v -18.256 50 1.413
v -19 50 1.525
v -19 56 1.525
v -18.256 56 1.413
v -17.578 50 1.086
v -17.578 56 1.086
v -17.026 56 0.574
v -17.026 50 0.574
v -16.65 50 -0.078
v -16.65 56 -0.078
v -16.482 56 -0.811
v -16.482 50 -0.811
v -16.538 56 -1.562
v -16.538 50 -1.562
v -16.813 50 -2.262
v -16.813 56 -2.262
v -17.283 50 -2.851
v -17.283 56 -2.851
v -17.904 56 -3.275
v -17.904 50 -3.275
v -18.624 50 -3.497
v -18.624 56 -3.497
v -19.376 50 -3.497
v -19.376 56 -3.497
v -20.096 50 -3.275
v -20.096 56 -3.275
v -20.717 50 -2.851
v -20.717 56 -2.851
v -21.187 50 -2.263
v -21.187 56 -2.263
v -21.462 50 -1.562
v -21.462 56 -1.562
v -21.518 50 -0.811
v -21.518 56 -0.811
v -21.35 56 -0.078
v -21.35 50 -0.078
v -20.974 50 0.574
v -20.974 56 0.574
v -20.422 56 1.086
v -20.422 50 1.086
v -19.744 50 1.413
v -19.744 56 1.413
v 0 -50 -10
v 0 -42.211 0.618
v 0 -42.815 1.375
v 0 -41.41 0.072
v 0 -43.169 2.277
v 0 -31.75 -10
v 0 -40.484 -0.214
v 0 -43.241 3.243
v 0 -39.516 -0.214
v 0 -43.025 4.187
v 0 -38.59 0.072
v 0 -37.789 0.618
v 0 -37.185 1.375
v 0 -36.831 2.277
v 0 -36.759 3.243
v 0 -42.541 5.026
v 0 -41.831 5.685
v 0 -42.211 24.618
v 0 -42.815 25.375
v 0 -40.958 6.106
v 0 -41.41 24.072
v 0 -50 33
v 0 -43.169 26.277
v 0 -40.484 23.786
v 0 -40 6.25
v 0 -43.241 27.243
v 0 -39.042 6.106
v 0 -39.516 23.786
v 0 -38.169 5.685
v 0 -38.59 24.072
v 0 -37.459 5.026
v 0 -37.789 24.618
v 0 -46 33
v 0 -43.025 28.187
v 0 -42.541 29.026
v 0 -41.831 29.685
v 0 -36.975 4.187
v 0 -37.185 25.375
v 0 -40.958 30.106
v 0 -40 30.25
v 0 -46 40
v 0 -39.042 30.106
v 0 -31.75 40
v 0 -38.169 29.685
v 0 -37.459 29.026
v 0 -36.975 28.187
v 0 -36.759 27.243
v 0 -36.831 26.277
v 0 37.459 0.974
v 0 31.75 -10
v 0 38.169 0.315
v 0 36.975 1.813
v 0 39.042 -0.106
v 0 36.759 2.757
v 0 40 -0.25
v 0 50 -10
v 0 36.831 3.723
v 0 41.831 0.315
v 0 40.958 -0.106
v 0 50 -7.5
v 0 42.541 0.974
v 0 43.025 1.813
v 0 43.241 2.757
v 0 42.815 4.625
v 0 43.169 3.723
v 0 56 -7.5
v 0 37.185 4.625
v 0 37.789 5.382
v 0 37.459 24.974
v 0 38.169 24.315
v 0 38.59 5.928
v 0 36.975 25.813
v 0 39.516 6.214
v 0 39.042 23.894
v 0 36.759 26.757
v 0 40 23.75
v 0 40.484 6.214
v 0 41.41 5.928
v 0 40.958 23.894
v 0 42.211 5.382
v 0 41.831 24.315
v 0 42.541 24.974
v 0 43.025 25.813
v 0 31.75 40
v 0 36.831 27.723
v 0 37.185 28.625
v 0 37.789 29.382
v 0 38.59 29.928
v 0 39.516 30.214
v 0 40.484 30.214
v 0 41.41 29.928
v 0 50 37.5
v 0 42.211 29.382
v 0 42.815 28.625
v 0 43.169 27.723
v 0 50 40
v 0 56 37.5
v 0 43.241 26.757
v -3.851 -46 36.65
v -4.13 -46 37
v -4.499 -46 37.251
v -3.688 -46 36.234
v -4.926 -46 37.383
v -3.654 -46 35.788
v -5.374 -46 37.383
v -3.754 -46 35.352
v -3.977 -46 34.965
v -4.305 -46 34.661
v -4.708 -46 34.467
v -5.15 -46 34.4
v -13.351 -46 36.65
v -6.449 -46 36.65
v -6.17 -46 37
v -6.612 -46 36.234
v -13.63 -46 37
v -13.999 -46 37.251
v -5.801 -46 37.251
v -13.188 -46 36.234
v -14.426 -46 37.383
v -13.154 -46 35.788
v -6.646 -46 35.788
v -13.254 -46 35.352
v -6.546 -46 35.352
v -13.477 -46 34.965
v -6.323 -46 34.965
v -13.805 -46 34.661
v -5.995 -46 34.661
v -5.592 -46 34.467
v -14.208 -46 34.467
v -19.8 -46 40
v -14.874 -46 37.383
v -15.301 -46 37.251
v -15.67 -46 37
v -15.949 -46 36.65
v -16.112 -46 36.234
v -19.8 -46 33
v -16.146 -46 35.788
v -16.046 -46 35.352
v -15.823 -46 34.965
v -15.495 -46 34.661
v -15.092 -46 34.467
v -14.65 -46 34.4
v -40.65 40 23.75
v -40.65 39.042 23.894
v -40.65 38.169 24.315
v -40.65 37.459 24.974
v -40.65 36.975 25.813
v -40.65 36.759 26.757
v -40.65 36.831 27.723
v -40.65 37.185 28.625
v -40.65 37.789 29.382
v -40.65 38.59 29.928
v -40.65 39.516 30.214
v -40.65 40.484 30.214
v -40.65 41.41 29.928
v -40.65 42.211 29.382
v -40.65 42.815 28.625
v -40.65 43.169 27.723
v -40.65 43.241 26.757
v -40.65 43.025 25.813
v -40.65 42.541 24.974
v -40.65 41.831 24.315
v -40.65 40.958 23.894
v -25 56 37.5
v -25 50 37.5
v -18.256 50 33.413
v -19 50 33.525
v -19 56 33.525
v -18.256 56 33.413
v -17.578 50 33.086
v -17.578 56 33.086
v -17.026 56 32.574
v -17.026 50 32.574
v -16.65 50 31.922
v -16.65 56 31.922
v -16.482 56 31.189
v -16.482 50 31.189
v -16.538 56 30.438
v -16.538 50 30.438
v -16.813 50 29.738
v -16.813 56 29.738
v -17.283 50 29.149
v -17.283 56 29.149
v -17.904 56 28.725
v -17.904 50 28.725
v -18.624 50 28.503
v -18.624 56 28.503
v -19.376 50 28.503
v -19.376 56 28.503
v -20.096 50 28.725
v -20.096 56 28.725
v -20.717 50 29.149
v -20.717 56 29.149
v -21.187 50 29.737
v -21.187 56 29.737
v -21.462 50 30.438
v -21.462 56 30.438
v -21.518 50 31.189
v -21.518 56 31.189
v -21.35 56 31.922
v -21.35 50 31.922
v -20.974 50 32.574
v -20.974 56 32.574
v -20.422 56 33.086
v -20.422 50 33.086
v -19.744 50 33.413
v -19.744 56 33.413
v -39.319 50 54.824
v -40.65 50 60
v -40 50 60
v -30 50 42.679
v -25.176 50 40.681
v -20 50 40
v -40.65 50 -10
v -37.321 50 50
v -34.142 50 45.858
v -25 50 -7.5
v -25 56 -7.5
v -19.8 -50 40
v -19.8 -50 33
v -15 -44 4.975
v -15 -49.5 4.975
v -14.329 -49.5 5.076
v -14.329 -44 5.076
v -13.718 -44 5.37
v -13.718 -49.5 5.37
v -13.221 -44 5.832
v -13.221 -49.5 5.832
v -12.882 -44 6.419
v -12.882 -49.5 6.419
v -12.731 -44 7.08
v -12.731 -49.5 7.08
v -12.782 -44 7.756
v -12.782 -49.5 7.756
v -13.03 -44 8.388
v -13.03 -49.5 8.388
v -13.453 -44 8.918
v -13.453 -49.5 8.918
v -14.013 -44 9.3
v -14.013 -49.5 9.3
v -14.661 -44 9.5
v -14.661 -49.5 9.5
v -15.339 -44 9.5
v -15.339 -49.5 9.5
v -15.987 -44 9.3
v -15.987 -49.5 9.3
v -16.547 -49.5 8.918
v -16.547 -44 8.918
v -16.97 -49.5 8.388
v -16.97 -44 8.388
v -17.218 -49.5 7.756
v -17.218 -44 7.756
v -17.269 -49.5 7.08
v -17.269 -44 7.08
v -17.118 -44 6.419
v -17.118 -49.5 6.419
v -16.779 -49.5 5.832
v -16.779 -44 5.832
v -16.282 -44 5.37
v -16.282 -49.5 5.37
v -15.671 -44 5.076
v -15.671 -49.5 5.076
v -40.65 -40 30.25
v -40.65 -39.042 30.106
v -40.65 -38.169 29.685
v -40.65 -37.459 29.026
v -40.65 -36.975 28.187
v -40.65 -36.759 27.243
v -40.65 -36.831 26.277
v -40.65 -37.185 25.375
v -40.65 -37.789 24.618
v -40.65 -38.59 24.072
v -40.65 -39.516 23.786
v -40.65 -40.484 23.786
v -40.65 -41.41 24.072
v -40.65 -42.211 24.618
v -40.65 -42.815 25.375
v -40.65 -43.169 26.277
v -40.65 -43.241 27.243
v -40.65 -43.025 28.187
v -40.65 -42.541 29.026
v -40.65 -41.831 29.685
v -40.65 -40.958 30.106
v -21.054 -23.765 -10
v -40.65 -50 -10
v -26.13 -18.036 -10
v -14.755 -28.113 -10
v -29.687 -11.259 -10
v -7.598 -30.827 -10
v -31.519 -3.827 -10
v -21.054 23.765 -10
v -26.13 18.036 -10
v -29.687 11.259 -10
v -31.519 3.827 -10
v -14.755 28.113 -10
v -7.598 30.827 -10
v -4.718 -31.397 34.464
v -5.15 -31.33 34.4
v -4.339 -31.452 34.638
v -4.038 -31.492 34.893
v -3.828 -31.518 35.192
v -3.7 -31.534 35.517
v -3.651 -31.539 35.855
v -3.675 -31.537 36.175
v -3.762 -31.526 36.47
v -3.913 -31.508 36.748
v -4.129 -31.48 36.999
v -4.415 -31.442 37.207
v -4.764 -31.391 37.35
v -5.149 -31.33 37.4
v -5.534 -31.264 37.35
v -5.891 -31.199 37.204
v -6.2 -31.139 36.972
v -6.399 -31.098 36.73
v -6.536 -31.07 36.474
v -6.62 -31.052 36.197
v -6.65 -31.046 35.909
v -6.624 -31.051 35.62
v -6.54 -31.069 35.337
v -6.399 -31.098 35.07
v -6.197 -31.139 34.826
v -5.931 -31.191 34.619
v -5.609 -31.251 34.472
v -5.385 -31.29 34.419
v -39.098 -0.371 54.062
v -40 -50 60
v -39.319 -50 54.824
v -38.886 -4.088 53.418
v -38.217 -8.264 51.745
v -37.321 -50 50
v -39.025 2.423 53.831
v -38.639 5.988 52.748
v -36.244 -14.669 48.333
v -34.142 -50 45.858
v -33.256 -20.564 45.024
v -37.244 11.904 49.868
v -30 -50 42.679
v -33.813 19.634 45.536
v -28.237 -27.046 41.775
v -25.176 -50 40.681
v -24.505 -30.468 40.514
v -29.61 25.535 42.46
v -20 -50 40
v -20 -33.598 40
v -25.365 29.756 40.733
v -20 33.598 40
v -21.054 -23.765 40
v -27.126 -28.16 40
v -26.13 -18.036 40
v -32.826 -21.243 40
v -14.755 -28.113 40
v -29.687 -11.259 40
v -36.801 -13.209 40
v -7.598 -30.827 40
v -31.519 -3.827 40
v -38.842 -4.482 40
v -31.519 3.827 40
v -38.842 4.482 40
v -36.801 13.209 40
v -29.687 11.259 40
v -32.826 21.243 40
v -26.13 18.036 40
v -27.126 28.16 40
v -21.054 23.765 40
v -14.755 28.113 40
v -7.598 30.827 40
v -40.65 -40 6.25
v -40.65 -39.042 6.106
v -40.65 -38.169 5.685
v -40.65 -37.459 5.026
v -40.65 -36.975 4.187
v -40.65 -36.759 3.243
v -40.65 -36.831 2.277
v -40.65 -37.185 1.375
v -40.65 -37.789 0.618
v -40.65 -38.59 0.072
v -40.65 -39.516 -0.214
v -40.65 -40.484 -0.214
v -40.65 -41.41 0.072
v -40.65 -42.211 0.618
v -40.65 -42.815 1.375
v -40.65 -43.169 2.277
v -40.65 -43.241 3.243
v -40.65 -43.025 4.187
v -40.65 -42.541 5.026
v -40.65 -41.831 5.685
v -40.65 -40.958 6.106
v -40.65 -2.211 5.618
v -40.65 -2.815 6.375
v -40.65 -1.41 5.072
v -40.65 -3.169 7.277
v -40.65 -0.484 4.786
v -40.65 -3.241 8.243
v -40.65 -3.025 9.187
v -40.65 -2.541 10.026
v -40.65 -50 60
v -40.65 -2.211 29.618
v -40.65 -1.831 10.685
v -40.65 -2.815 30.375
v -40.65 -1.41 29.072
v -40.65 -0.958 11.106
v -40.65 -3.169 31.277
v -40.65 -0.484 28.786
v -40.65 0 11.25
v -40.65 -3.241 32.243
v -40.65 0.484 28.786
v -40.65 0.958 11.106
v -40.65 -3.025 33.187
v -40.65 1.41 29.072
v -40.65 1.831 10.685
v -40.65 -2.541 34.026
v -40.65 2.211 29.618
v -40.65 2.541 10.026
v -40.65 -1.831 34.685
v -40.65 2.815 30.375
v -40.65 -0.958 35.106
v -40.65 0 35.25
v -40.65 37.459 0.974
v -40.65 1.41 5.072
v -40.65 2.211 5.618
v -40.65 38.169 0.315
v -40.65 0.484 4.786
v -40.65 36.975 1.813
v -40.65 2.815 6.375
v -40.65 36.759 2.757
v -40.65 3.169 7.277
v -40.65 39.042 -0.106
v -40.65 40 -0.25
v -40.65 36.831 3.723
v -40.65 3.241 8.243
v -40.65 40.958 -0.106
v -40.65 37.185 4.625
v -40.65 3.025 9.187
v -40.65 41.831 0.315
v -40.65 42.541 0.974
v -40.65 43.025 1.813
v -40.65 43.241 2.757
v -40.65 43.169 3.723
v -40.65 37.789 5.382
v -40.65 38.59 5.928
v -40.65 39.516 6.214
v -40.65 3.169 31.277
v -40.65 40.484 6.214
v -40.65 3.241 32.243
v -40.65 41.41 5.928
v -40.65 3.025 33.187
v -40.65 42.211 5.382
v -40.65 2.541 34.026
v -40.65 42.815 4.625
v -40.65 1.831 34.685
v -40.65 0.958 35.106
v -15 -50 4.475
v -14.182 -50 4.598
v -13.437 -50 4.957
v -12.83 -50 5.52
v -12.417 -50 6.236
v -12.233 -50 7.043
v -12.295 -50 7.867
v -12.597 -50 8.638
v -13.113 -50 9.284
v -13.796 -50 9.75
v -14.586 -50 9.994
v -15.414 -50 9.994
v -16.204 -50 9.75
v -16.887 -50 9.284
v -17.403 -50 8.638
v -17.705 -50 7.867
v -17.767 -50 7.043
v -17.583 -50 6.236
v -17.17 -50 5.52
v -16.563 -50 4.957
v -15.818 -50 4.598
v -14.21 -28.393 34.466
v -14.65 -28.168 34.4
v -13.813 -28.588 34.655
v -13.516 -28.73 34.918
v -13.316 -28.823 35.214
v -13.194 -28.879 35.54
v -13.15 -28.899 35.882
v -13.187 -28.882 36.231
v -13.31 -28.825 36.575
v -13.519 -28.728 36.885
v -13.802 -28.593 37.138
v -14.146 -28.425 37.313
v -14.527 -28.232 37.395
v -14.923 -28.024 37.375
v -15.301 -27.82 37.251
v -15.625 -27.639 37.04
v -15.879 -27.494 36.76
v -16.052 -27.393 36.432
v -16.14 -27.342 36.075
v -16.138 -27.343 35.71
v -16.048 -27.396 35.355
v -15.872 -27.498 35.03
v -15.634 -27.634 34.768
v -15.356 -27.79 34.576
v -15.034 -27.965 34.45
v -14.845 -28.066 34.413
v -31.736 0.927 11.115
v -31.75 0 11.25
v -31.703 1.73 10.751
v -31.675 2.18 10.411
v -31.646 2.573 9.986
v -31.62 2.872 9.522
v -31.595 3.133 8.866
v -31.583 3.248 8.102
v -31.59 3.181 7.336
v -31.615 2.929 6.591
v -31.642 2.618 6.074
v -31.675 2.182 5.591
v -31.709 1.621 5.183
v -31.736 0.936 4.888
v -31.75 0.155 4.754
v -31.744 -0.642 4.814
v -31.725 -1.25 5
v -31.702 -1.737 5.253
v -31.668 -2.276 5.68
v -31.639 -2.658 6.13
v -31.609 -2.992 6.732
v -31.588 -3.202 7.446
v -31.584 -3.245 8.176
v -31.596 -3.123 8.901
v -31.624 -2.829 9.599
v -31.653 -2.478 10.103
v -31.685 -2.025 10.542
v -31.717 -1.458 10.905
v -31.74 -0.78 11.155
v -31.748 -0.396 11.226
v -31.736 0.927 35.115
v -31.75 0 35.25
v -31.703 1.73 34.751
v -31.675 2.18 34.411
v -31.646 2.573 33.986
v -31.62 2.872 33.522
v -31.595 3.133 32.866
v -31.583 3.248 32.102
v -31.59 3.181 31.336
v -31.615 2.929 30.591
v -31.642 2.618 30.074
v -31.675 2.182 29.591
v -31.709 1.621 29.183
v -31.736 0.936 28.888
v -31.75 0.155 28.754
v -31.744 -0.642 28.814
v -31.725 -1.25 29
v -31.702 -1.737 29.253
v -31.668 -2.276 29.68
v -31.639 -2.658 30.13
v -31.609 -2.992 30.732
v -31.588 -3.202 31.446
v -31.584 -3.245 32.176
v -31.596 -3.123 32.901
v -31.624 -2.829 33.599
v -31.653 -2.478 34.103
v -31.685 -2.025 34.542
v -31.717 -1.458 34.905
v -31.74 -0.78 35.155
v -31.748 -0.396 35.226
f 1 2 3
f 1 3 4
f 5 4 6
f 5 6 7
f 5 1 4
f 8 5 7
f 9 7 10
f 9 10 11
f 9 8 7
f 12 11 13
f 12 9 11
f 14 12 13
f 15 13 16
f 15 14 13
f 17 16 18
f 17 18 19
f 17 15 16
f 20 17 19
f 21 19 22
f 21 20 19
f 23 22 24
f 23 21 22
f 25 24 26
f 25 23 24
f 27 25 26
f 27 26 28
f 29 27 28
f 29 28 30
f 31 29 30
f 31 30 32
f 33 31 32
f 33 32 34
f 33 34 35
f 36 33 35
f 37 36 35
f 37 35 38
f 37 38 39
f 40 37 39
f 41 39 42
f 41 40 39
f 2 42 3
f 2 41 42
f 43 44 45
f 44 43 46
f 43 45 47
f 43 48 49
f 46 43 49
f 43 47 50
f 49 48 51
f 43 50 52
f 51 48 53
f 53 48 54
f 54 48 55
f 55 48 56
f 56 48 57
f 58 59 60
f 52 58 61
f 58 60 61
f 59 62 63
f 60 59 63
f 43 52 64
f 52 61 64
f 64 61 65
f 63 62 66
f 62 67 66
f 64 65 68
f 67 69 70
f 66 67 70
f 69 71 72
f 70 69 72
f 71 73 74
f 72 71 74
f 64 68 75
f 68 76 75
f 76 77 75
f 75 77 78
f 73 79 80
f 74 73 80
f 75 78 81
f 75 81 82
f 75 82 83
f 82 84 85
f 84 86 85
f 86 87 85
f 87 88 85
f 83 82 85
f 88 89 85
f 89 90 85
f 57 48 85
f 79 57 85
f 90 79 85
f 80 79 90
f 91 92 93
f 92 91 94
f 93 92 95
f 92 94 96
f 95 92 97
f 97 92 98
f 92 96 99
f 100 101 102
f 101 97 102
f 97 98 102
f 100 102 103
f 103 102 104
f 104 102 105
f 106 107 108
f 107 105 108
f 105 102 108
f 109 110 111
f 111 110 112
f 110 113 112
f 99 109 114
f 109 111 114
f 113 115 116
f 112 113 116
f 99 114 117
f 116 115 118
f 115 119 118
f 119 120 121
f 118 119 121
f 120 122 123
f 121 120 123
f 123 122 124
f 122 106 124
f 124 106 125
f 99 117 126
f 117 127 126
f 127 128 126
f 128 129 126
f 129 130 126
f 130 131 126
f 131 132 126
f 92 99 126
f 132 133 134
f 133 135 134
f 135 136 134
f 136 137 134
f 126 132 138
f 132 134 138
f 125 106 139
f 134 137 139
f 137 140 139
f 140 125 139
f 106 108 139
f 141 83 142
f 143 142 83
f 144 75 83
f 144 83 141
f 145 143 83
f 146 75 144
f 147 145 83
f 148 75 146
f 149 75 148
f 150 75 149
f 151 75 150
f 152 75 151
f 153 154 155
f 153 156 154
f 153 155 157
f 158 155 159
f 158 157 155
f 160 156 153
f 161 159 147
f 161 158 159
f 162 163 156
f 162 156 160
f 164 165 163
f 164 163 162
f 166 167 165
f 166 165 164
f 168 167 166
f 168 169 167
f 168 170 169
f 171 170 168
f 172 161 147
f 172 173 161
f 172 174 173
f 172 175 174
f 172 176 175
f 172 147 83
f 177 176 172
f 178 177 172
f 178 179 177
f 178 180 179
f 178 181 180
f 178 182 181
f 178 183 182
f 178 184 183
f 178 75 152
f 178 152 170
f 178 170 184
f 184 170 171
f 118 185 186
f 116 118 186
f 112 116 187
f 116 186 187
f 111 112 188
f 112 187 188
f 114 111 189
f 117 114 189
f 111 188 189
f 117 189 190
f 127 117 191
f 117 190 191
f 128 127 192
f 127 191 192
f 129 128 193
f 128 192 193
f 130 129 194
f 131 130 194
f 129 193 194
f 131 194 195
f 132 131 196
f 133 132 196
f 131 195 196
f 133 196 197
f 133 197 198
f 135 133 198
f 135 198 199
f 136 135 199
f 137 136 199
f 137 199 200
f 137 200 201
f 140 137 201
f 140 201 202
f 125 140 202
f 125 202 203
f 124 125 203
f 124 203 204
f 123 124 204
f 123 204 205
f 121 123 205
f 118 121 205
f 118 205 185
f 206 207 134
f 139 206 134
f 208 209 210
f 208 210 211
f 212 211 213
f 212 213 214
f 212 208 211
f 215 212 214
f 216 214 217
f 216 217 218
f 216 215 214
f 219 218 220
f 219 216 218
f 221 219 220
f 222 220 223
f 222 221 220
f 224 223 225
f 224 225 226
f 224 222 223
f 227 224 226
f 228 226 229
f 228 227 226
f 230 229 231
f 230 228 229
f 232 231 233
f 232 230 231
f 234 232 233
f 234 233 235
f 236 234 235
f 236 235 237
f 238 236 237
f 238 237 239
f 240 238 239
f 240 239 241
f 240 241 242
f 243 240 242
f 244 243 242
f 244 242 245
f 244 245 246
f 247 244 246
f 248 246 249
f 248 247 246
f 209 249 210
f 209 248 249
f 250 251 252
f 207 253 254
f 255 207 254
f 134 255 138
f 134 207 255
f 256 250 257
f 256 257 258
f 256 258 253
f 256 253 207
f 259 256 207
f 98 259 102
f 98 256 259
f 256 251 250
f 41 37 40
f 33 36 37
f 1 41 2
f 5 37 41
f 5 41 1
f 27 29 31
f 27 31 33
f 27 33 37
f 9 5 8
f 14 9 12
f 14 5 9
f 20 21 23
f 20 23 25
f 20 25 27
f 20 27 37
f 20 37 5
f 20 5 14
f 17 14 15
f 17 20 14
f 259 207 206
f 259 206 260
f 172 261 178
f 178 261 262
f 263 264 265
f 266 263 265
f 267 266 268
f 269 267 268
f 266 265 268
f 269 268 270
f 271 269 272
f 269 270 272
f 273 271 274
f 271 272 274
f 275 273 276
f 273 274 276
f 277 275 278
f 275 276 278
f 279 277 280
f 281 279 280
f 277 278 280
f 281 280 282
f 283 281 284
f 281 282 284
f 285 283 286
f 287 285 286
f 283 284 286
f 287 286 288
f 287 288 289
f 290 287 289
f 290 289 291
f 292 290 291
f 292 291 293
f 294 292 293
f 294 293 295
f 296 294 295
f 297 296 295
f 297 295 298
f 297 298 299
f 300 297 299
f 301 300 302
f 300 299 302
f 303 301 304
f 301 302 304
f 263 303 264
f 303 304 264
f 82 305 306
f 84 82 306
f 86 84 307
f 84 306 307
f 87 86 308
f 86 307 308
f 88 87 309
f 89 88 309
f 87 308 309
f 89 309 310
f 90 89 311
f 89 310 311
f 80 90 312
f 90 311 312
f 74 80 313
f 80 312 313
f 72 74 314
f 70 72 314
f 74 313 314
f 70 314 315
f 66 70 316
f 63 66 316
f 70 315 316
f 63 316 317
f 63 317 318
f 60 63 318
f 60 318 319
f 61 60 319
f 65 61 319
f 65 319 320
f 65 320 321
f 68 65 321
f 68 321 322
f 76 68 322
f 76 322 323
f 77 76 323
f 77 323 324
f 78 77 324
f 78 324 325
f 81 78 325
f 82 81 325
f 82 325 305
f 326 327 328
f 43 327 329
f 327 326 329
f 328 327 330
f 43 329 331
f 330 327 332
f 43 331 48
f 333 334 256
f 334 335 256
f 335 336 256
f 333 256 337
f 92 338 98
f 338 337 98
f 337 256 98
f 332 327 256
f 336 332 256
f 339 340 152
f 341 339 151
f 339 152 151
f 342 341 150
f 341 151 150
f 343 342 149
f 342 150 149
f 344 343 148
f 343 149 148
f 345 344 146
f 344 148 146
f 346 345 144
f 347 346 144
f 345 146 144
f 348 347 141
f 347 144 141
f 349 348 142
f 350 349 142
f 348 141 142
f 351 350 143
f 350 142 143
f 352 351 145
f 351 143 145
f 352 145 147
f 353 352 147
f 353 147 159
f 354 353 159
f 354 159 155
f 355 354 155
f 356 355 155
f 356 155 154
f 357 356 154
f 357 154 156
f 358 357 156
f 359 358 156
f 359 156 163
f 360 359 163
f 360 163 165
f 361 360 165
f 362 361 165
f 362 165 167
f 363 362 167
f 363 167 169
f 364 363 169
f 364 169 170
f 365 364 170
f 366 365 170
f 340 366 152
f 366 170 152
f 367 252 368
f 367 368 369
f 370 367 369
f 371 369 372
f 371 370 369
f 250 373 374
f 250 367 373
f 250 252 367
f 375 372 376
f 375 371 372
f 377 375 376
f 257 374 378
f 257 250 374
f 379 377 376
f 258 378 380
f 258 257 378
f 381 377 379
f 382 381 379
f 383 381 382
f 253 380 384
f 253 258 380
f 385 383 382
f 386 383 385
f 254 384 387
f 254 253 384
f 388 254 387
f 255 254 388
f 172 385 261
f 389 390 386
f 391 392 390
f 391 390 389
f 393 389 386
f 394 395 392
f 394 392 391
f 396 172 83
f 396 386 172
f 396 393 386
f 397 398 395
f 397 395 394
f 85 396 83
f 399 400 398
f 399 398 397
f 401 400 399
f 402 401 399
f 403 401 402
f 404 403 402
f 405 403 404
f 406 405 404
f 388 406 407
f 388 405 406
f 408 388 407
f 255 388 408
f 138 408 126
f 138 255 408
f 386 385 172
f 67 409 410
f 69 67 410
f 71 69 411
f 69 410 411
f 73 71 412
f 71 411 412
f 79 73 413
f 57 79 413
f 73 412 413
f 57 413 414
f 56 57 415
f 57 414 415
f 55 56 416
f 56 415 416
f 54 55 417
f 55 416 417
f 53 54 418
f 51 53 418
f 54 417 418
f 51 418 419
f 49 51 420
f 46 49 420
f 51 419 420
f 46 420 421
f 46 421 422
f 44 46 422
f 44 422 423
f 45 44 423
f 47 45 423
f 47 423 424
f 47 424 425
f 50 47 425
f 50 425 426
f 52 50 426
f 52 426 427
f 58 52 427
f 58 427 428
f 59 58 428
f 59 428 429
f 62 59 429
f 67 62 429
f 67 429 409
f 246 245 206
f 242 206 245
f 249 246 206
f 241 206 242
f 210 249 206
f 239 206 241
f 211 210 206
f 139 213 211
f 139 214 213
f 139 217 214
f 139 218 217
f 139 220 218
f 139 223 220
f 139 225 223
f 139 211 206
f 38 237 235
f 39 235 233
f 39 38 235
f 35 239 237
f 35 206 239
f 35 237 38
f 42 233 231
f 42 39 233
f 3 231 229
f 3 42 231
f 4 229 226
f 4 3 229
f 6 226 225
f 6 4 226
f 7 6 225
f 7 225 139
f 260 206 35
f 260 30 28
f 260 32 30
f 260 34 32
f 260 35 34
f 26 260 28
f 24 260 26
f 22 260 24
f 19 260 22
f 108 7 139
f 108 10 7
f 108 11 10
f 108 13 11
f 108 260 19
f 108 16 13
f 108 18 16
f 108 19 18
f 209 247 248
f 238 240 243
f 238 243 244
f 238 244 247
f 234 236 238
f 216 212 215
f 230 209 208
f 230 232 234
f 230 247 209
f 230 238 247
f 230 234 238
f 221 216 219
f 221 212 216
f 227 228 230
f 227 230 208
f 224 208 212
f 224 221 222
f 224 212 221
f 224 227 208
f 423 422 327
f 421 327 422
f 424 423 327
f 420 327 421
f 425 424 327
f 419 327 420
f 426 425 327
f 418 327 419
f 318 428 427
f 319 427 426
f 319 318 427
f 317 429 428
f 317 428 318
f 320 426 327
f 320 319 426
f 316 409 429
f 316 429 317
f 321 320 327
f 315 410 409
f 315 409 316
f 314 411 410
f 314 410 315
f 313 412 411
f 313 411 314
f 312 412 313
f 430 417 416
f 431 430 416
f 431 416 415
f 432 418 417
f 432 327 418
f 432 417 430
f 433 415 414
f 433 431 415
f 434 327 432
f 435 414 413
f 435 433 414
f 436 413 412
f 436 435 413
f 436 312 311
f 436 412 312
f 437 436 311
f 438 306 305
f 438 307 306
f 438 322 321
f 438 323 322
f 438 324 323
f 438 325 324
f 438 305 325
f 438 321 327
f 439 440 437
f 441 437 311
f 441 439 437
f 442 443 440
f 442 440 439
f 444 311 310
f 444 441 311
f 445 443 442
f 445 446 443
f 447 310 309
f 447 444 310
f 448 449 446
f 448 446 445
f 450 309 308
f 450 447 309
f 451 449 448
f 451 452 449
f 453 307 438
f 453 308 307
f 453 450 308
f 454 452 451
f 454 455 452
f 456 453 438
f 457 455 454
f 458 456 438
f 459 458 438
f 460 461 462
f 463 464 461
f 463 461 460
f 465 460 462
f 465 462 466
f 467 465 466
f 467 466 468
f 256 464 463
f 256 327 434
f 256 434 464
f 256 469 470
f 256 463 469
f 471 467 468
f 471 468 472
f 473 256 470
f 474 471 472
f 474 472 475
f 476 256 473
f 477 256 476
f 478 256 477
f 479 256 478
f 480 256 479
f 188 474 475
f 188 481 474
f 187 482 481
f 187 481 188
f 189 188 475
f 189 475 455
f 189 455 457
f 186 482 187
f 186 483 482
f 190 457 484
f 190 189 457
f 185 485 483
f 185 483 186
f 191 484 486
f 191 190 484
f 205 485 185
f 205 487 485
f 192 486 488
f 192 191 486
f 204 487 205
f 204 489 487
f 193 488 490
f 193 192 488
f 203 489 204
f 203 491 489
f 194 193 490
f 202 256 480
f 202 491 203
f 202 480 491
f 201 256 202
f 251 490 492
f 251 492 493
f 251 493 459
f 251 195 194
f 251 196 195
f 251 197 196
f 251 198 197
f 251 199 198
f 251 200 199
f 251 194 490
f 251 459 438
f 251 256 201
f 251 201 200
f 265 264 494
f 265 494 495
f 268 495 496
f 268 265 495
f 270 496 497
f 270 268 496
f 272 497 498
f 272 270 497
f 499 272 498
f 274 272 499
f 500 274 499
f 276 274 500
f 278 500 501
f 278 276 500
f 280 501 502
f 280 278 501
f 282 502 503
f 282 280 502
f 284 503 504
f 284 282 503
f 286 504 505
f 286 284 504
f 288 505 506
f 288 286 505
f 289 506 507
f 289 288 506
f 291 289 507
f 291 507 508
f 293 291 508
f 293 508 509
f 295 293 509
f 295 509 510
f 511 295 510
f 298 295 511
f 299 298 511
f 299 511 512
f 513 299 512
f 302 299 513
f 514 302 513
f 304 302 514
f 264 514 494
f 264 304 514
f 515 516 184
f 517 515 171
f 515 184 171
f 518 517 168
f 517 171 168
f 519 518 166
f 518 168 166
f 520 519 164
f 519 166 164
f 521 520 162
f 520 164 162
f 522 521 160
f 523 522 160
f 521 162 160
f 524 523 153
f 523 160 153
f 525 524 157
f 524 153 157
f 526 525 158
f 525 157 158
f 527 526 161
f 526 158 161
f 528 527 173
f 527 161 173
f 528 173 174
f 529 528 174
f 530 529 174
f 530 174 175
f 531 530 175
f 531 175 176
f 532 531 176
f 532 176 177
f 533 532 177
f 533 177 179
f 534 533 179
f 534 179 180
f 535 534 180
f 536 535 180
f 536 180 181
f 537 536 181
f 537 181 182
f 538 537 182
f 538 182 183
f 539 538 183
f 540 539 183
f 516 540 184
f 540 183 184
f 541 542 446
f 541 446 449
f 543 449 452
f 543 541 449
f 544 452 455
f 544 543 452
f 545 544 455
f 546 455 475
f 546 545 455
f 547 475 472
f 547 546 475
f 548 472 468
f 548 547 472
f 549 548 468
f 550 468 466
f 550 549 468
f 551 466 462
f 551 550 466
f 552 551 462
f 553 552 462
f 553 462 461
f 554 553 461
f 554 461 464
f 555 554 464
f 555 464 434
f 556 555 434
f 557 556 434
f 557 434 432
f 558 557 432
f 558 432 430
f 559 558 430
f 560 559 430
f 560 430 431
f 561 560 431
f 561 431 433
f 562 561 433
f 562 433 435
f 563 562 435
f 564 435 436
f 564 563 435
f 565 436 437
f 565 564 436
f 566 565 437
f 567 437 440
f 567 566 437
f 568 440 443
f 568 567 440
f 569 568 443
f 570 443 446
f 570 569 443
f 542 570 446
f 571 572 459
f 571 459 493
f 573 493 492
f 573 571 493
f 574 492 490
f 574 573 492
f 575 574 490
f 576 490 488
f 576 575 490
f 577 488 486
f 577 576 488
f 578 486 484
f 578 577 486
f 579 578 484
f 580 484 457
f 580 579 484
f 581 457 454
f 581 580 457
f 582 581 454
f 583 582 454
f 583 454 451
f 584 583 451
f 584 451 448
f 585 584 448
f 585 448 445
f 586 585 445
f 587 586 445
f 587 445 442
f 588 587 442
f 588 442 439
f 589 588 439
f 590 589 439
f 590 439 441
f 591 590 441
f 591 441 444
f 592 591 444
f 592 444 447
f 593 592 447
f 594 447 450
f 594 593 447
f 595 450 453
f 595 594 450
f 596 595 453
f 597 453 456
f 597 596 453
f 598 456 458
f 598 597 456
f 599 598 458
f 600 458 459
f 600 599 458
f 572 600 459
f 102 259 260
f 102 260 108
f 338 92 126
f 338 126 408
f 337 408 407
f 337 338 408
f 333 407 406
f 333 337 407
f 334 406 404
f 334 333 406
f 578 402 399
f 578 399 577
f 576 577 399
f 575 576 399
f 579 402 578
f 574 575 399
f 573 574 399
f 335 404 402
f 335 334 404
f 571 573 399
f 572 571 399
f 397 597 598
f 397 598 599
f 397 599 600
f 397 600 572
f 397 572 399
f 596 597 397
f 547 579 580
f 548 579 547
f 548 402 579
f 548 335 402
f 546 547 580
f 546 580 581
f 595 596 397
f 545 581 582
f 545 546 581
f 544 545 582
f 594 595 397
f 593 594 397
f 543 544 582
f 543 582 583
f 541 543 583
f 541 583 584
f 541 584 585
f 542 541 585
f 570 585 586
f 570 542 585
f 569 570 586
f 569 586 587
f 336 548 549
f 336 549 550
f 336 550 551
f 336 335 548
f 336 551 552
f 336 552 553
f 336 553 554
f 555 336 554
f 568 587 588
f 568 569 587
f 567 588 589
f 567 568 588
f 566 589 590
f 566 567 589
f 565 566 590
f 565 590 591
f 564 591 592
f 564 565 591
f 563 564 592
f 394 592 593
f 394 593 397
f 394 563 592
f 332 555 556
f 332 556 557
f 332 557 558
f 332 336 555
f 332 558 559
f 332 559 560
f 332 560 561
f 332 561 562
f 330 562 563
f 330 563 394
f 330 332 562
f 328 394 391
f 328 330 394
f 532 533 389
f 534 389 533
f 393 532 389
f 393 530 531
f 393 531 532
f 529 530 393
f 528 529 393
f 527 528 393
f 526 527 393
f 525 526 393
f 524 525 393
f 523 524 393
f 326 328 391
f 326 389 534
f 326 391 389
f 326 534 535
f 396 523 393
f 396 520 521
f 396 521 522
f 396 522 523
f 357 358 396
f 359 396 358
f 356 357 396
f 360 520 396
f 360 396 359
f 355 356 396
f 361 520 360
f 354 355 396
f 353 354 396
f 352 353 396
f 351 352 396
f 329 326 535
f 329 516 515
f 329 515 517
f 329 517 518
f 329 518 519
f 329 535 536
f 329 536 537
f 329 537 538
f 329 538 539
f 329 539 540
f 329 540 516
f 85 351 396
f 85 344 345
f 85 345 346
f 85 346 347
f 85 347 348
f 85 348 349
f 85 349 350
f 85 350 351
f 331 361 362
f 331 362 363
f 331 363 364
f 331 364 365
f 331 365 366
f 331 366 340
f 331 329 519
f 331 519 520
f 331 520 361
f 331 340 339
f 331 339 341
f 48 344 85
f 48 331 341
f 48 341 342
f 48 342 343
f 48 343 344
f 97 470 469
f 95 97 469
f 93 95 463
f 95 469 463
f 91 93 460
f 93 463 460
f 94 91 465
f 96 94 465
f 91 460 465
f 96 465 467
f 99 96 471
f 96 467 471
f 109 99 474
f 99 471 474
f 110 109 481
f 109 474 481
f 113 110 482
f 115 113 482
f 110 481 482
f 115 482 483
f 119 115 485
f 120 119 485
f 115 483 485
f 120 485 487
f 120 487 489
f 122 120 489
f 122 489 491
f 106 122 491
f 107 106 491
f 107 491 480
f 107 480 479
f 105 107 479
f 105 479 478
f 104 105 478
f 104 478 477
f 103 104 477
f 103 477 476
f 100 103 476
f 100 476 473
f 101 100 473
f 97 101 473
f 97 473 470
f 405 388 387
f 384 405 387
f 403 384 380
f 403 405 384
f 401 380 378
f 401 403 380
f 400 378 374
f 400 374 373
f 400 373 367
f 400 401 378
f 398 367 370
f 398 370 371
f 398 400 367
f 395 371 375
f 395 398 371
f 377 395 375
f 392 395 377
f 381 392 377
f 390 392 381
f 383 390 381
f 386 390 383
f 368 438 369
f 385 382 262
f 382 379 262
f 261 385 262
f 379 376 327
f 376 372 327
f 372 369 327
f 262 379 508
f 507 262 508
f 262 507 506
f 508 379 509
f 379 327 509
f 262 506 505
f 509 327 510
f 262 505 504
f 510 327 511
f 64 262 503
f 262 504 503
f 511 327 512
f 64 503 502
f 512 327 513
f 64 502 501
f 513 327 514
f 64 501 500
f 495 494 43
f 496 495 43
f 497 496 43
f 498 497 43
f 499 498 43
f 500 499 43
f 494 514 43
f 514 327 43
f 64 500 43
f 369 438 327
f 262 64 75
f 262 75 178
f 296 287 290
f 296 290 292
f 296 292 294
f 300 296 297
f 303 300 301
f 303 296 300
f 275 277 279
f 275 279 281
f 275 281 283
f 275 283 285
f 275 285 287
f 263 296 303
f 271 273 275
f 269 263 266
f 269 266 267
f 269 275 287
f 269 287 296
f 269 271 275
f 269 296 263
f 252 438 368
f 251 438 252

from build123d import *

# Parameters (mm, degrees)
CENTRE_HOLE_FOR_L2_DEPTH      = 40
CENTRE_HOLE_FOR_L2_DEPTH_BACK = 10
SKETCH1_R                     = 39.1
SKETCH1_R_2                   = 31.75
MAIN_STRUCTURE_DEPTH          = 60
MAIN_STRUCTURE_DEPTH_BACK     = 50
SKETCH2_W                     = 100
SKETCH2_H                     = 100
SKETCH2_R                     = 39.1
BEARING_CURVE_DEPTH           = 10
SKETCH6_R                     = 10.5
SHAFT_HOLE_DEPTH              = 10
WRIST_CUTOUT_DEPTH            = 188.082869339
SKETCH11_W                    = 25
SKETCH11_H                    = 45
SKETCH11_R                    = 2.525
BOSS_EXTRUDE1_DEPTH           = 6
SKETCH15_W                    = 19.8
SKETCH15_H                    = 7
CUT_EXTRUDE4_DEPTH            = 4
CUT_EXTRUDE5_REACH            = 190.16
CUT_EXTRUDE5_END_RADIUS       = 31.75
SKETCH16_R                    = 1.5
CUT_EXTRUDE6_DEPTH            = 168.7378908
CUT_EXTRUDE6_DEPTH_BACK       = 168.7378908
SKETCH18_R                    = 3.25
CUT_EXTRUDE7_START            = -1.5875
CUT_EXTRUDE7_DEPTH            = 1.5875
SKETCH9_R                     = 12.05
BEARING_DEPTH                 = 5
CUT_EXTRUDE8_DEPTH            = 3
SKETCH21_R                    = 3.25
SKETCH21_R_2                  = 1.65
CUT_EXTRUDE9_DEPTH            = 167.868211501
CUT_EXTRUDE10_DEPTH           = 6.35
SKETCH23_R                    = 2.275
CUT_EXTRUDE11_DEPTH           = 6
CHAMFER1_SIZE                 = 0.5


with BuildPart() as part:
    # Sketch1 → Centre Hole for L2 (new, two sides: drawn at the far end of the back side and taken through both)
    with BuildSketch(Plane.XY.offset(-CENTRE_HOLE_FOR_L2_DEPTH_BACK)):
        Circle(SKETCH1_R)
        Circle(SKETCH1_R_2, mode=Mode.SUBTRACT)
    extrude(amount=CENTRE_HOLE_FOR_L2_DEPTH + CENTRE_HOLE_FOR_L2_DEPTH_BACK)

    # Sketch2 → Main Structure (add, two sides: drawn at the far end of the back side and taken through both)
    with BuildSketch(Plane.XY.offset(40).offset(-MAIN_STRUCTURE_DEPTH_BACK)):
        Rectangle(SKETCH2_W, SKETCH2_H)
        Circle(SKETCH2_R, mode=Mode.SUBTRACT)
    extrude(amount=MAIN_STRUCTURE_DEPTH + MAIN_STRUCTURE_DEPTH_BACK)

    # Sketch3 → Bearing Curve (add)
    with BuildSketch(Plane.ZY.offset(50)):
        with BuildLine():
            Line((100, 50), (100, -50))
            ThreePointArc((100, -50), (150, 0), (100, 50))
        make_face()
    bearing_curve = extrude(amount=-BEARING_CURVE_DEPTH)

    # Upright Mirror: Bearing Curve across plane
    add(bearing_curve.mirror(Plane(origin=(0, 0, 0), x_dir=(0, 0, 1), z_dir=(1, 0, 0))))

    # Sketch6 → Shaft Hole (cut)
    with BuildSketch(Plane.ZY.offset(50)):
        with Locations((100, 0)):
            Circle(SKETCH6_R)
    extrude(amount=-SHAFT_HOLE_DEPTH, mode=Mode.SUBTRACT)

    # Sketch4 → Wrist Cutout (cut, through all)
    with BuildSketch(Plane(origin=(0, 50, 0), x_dir=(1, 0, 0), z_dir=(0, 1, 0))):
        with BuildLine():
            Line((-40, -100), (-40, -60))
            ThreePointArc((-40, -60), (-34.142135624, -45.857864376), (-20, -40))
            Line((-20, -40), (20, -40))
            ThreePointArc((20, -40), (34.142135624, -45.857864376), (40, -60))
            Line((40, -60), (40, -100))
            Line((40, -100), (-40, -100))
        make_face()
    extrude(amount=-WRIST_CUTOUT_DEPTH, mode=Mode.SUBTRACT)

    # SurfaceCut1
    split(bisect_by=Plane.ZY, keep=Keep.TOP)

    # Sketch11 → Boss-Extrude1 (add)
    with BuildSketch(Plane(origin=(0, 50, 0), x_dir=(1, 0, 0), z_dir=(0, 1, 0))):
        with Locations((-12.5, -15)):
            Rectangle(SKETCH11_W, SKETCH11_H)
        with Locations(Location((-19, 1, 0), (0, 0, 270))):
            Circle(SKETCH11_R, mode=Mode.SUBTRACT)
        with Locations(Location((-19, -31, 0), (0, 0, 270))):
            Circle(SKETCH11_R, mode=Mode.SUBTRACT)
    extrude(amount=BOSS_EXTRUDE1_DEPTH)

    # Sketch15 → Cut-Extrude4 (cut)
    with BuildSketch(Plane(origin=(0, -50, 0), x_dir=(-1, 0, 0), z_dir=(0, -1, 0))):
        with Locations((9.9, -36.5)):
            Rectangle(SKETCH15_W, SKETCH15_H)
    extrude(amount=-CUT_EXTRUDE4_DEPTH, mode=Mode.SUBTRACT)

    # Cut-Extrude5: up to this cylinder (the profile starts outside it)
    cut_extrude5_end = Plane(origin=(0, 0, 35.9), z_dir=(0, 0, 1)) * Cylinder(CUT_EXTRUDE5_END_RADIUS, 444.82, mode=Mode.PRIVATE)
    # Sketch16 → Cut-Extrude5 (cut, up to the surface)
    with BuildSketch(Plane(origin=(0, -46, 0), x_dir=(-1, 0, 0), z_dir=(0, -1, 0)), mode=Mode.PRIVATE) as cut_extrude5_sk1:
        with Locations(Location((14.65, -35.9, 0), (0, 0, 90))):
            Circle(SKETCH16_R)
    cut_extrude5_tool1 = extrude(cut_extrude5_sk1.sketch, amount=-CUT_EXTRUDE5_REACH, mode=Mode.PRIVATE) - cut_extrude5_end
    add(cut_extrude5_tool1.solids().sort_by_distance((-14.65, -46, 35.9))[0], mode=Mode.SUBTRACT)
    # Sketch16 → Cut-Extrude5 (cut, up to the surface)
    with BuildSketch(Plane(origin=(0, -46, 0), x_dir=(-1, 0, 0), z_dir=(0, -1, 0)), mode=Mode.PRIVATE) as cut_extrude5_sk2:
        with Locations(Location((5.15, -35.9, 0), (0, 0, 90))):
            Circle(SKETCH16_R)
    cut_extrude5_tool2 = extrude(cut_extrude5_sk2.sketch, amount=-CUT_EXTRUDE5_REACH, mode=Mode.PRIVATE) - cut_extrude5_end
    add(cut_extrude5_tool2.solids().sort_by_distance((-5.15, -46, 35.9))[0], mode=Mode.SUBTRACT)

    # Sketch18 → Cut-Extrude6 (cut, two sides: drawn at the far end of the back side and taken through both)
    with BuildSketch(Plane.ZY.offset(50).offset(-CUT_EXTRUDE6_DEPTH_BACK)):
        with Locations((8, 0)):
            Circle(SKETCH18_R)
        with Locations((32, 0)):
            Circle(SKETCH18_R)
    extrude(amount=CUT_EXTRUDE6_DEPTH + CUT_EXTRUDE6_DEPTH_BACK, mode=Mode.SUBTRACT)

    # Sketch19 → Cut-Extrude7 (cut)
    with BuildSketch(Plane(origin=(-40, 0, 0), x_dir=(0, 0, -1), z_dir=(1, 0, 0)).offset(CUT_EXTRUDE7_START)):
        with BuildLine():
            Line((-60, 50), (-100, 50))
            ThreePointArc((-100, 50), (-150, 0), (-100, -50))
            Line((-100, -50), (-60, -50))
            Line((-60, -50), (-60, 50))
        make_face()
    extrude(amount=CUT_EXTRUDE7_DEPTH, mode=Mode.SUBTRACT)

    # Sketch9 → Bearing (cut)
    with BuildSketch(Plane(origin=(-41.5875, 0, 0), x_dir=(0, 0, -1), z_dir=(1, 0, 0))):
        with Locations((-100, 0)):
            Circle(SKETCH9_R)
    extrude(amount=-BEARING_DEPTH, mode=Mode.SUBTRACT)

    # Sketch20 → Cut-Extrude8 (cut)
    with BuildSketch(Plane.ZY.offset(50)):
        with BuildLine():
            Line((-10, -50), (100, -50))
            ThreePointArc((100, -50), (150, 0), (100, 50))
            Line((100, 50), (-10, 50))
            Line((-10, 50), (-10, -50))
        make_face()
    extrude(amount=-CUT_EXTRUDE8_DEPTH, mode=Mode.SUBTRACT)

    # Sketch21 → Cut-Extrude9 (cut, through all)
    with BuildSketch(Plane.ZY.offset(47)):
        with Locations((3, -40)):
            Circle(SKETCH21_R)
        with Locations((27, -40)):
            Circle(SKETCH21_R)
        with Locations(Location((27, 40, 0), (0, 0, 180))):
            Circle(SKETCH21_R)
        with Locations(Location((3, 40, 0), (0, 0, 180))):
            Circle(SKETCH21_R)
        with Locations((125, 0)):
            Circle(SKETCH21_R_2)
    extrude(amount=-CUT_EXTRUDE9_DEPTH, mode=Mode.SUBTRACT)

    # Sketch22 → Cut-Extrude10 (cut)
    with BuildSketch(Plane.ZY.offset(47)):
        with BuildLine():
            Line((-10, 50), (-10, -50))
            Line((-10, -50), (100, -50))
            ThreePointArc((100, -50), (150, 0), (100, 50))
            Line((100, 50), (-10, 50))
        make_face()
    extrude(amount=-CUT_EXTRUDE10_DEPTH, mode=Mode.SUBTRACT)

    # Sketch23 → Cut-Extrude11 (cut)
    with BuildSketch(Plane(origin=(0, -50, 0), x_dir=(-1, 0, 0), z_dir=(0, -1, 0))):
        with Locations(Location((15, -7.25, 0), (0, 0, 90))):
            Circle(SKETCH23_R)
    extrude(amount=-CUT_EXTRUDE11_DEPTH, mode=Mode.SUBTRACT)

    # Chamfer1
    chamfer1_edges = [part.edges().sort_by_distance(p)[0] for p in [
        (-15, -50, 9.525),
    ]]
    chamfer(chamfer1_edges, length=CHAMFER1_SIZE)


solid = part.part
